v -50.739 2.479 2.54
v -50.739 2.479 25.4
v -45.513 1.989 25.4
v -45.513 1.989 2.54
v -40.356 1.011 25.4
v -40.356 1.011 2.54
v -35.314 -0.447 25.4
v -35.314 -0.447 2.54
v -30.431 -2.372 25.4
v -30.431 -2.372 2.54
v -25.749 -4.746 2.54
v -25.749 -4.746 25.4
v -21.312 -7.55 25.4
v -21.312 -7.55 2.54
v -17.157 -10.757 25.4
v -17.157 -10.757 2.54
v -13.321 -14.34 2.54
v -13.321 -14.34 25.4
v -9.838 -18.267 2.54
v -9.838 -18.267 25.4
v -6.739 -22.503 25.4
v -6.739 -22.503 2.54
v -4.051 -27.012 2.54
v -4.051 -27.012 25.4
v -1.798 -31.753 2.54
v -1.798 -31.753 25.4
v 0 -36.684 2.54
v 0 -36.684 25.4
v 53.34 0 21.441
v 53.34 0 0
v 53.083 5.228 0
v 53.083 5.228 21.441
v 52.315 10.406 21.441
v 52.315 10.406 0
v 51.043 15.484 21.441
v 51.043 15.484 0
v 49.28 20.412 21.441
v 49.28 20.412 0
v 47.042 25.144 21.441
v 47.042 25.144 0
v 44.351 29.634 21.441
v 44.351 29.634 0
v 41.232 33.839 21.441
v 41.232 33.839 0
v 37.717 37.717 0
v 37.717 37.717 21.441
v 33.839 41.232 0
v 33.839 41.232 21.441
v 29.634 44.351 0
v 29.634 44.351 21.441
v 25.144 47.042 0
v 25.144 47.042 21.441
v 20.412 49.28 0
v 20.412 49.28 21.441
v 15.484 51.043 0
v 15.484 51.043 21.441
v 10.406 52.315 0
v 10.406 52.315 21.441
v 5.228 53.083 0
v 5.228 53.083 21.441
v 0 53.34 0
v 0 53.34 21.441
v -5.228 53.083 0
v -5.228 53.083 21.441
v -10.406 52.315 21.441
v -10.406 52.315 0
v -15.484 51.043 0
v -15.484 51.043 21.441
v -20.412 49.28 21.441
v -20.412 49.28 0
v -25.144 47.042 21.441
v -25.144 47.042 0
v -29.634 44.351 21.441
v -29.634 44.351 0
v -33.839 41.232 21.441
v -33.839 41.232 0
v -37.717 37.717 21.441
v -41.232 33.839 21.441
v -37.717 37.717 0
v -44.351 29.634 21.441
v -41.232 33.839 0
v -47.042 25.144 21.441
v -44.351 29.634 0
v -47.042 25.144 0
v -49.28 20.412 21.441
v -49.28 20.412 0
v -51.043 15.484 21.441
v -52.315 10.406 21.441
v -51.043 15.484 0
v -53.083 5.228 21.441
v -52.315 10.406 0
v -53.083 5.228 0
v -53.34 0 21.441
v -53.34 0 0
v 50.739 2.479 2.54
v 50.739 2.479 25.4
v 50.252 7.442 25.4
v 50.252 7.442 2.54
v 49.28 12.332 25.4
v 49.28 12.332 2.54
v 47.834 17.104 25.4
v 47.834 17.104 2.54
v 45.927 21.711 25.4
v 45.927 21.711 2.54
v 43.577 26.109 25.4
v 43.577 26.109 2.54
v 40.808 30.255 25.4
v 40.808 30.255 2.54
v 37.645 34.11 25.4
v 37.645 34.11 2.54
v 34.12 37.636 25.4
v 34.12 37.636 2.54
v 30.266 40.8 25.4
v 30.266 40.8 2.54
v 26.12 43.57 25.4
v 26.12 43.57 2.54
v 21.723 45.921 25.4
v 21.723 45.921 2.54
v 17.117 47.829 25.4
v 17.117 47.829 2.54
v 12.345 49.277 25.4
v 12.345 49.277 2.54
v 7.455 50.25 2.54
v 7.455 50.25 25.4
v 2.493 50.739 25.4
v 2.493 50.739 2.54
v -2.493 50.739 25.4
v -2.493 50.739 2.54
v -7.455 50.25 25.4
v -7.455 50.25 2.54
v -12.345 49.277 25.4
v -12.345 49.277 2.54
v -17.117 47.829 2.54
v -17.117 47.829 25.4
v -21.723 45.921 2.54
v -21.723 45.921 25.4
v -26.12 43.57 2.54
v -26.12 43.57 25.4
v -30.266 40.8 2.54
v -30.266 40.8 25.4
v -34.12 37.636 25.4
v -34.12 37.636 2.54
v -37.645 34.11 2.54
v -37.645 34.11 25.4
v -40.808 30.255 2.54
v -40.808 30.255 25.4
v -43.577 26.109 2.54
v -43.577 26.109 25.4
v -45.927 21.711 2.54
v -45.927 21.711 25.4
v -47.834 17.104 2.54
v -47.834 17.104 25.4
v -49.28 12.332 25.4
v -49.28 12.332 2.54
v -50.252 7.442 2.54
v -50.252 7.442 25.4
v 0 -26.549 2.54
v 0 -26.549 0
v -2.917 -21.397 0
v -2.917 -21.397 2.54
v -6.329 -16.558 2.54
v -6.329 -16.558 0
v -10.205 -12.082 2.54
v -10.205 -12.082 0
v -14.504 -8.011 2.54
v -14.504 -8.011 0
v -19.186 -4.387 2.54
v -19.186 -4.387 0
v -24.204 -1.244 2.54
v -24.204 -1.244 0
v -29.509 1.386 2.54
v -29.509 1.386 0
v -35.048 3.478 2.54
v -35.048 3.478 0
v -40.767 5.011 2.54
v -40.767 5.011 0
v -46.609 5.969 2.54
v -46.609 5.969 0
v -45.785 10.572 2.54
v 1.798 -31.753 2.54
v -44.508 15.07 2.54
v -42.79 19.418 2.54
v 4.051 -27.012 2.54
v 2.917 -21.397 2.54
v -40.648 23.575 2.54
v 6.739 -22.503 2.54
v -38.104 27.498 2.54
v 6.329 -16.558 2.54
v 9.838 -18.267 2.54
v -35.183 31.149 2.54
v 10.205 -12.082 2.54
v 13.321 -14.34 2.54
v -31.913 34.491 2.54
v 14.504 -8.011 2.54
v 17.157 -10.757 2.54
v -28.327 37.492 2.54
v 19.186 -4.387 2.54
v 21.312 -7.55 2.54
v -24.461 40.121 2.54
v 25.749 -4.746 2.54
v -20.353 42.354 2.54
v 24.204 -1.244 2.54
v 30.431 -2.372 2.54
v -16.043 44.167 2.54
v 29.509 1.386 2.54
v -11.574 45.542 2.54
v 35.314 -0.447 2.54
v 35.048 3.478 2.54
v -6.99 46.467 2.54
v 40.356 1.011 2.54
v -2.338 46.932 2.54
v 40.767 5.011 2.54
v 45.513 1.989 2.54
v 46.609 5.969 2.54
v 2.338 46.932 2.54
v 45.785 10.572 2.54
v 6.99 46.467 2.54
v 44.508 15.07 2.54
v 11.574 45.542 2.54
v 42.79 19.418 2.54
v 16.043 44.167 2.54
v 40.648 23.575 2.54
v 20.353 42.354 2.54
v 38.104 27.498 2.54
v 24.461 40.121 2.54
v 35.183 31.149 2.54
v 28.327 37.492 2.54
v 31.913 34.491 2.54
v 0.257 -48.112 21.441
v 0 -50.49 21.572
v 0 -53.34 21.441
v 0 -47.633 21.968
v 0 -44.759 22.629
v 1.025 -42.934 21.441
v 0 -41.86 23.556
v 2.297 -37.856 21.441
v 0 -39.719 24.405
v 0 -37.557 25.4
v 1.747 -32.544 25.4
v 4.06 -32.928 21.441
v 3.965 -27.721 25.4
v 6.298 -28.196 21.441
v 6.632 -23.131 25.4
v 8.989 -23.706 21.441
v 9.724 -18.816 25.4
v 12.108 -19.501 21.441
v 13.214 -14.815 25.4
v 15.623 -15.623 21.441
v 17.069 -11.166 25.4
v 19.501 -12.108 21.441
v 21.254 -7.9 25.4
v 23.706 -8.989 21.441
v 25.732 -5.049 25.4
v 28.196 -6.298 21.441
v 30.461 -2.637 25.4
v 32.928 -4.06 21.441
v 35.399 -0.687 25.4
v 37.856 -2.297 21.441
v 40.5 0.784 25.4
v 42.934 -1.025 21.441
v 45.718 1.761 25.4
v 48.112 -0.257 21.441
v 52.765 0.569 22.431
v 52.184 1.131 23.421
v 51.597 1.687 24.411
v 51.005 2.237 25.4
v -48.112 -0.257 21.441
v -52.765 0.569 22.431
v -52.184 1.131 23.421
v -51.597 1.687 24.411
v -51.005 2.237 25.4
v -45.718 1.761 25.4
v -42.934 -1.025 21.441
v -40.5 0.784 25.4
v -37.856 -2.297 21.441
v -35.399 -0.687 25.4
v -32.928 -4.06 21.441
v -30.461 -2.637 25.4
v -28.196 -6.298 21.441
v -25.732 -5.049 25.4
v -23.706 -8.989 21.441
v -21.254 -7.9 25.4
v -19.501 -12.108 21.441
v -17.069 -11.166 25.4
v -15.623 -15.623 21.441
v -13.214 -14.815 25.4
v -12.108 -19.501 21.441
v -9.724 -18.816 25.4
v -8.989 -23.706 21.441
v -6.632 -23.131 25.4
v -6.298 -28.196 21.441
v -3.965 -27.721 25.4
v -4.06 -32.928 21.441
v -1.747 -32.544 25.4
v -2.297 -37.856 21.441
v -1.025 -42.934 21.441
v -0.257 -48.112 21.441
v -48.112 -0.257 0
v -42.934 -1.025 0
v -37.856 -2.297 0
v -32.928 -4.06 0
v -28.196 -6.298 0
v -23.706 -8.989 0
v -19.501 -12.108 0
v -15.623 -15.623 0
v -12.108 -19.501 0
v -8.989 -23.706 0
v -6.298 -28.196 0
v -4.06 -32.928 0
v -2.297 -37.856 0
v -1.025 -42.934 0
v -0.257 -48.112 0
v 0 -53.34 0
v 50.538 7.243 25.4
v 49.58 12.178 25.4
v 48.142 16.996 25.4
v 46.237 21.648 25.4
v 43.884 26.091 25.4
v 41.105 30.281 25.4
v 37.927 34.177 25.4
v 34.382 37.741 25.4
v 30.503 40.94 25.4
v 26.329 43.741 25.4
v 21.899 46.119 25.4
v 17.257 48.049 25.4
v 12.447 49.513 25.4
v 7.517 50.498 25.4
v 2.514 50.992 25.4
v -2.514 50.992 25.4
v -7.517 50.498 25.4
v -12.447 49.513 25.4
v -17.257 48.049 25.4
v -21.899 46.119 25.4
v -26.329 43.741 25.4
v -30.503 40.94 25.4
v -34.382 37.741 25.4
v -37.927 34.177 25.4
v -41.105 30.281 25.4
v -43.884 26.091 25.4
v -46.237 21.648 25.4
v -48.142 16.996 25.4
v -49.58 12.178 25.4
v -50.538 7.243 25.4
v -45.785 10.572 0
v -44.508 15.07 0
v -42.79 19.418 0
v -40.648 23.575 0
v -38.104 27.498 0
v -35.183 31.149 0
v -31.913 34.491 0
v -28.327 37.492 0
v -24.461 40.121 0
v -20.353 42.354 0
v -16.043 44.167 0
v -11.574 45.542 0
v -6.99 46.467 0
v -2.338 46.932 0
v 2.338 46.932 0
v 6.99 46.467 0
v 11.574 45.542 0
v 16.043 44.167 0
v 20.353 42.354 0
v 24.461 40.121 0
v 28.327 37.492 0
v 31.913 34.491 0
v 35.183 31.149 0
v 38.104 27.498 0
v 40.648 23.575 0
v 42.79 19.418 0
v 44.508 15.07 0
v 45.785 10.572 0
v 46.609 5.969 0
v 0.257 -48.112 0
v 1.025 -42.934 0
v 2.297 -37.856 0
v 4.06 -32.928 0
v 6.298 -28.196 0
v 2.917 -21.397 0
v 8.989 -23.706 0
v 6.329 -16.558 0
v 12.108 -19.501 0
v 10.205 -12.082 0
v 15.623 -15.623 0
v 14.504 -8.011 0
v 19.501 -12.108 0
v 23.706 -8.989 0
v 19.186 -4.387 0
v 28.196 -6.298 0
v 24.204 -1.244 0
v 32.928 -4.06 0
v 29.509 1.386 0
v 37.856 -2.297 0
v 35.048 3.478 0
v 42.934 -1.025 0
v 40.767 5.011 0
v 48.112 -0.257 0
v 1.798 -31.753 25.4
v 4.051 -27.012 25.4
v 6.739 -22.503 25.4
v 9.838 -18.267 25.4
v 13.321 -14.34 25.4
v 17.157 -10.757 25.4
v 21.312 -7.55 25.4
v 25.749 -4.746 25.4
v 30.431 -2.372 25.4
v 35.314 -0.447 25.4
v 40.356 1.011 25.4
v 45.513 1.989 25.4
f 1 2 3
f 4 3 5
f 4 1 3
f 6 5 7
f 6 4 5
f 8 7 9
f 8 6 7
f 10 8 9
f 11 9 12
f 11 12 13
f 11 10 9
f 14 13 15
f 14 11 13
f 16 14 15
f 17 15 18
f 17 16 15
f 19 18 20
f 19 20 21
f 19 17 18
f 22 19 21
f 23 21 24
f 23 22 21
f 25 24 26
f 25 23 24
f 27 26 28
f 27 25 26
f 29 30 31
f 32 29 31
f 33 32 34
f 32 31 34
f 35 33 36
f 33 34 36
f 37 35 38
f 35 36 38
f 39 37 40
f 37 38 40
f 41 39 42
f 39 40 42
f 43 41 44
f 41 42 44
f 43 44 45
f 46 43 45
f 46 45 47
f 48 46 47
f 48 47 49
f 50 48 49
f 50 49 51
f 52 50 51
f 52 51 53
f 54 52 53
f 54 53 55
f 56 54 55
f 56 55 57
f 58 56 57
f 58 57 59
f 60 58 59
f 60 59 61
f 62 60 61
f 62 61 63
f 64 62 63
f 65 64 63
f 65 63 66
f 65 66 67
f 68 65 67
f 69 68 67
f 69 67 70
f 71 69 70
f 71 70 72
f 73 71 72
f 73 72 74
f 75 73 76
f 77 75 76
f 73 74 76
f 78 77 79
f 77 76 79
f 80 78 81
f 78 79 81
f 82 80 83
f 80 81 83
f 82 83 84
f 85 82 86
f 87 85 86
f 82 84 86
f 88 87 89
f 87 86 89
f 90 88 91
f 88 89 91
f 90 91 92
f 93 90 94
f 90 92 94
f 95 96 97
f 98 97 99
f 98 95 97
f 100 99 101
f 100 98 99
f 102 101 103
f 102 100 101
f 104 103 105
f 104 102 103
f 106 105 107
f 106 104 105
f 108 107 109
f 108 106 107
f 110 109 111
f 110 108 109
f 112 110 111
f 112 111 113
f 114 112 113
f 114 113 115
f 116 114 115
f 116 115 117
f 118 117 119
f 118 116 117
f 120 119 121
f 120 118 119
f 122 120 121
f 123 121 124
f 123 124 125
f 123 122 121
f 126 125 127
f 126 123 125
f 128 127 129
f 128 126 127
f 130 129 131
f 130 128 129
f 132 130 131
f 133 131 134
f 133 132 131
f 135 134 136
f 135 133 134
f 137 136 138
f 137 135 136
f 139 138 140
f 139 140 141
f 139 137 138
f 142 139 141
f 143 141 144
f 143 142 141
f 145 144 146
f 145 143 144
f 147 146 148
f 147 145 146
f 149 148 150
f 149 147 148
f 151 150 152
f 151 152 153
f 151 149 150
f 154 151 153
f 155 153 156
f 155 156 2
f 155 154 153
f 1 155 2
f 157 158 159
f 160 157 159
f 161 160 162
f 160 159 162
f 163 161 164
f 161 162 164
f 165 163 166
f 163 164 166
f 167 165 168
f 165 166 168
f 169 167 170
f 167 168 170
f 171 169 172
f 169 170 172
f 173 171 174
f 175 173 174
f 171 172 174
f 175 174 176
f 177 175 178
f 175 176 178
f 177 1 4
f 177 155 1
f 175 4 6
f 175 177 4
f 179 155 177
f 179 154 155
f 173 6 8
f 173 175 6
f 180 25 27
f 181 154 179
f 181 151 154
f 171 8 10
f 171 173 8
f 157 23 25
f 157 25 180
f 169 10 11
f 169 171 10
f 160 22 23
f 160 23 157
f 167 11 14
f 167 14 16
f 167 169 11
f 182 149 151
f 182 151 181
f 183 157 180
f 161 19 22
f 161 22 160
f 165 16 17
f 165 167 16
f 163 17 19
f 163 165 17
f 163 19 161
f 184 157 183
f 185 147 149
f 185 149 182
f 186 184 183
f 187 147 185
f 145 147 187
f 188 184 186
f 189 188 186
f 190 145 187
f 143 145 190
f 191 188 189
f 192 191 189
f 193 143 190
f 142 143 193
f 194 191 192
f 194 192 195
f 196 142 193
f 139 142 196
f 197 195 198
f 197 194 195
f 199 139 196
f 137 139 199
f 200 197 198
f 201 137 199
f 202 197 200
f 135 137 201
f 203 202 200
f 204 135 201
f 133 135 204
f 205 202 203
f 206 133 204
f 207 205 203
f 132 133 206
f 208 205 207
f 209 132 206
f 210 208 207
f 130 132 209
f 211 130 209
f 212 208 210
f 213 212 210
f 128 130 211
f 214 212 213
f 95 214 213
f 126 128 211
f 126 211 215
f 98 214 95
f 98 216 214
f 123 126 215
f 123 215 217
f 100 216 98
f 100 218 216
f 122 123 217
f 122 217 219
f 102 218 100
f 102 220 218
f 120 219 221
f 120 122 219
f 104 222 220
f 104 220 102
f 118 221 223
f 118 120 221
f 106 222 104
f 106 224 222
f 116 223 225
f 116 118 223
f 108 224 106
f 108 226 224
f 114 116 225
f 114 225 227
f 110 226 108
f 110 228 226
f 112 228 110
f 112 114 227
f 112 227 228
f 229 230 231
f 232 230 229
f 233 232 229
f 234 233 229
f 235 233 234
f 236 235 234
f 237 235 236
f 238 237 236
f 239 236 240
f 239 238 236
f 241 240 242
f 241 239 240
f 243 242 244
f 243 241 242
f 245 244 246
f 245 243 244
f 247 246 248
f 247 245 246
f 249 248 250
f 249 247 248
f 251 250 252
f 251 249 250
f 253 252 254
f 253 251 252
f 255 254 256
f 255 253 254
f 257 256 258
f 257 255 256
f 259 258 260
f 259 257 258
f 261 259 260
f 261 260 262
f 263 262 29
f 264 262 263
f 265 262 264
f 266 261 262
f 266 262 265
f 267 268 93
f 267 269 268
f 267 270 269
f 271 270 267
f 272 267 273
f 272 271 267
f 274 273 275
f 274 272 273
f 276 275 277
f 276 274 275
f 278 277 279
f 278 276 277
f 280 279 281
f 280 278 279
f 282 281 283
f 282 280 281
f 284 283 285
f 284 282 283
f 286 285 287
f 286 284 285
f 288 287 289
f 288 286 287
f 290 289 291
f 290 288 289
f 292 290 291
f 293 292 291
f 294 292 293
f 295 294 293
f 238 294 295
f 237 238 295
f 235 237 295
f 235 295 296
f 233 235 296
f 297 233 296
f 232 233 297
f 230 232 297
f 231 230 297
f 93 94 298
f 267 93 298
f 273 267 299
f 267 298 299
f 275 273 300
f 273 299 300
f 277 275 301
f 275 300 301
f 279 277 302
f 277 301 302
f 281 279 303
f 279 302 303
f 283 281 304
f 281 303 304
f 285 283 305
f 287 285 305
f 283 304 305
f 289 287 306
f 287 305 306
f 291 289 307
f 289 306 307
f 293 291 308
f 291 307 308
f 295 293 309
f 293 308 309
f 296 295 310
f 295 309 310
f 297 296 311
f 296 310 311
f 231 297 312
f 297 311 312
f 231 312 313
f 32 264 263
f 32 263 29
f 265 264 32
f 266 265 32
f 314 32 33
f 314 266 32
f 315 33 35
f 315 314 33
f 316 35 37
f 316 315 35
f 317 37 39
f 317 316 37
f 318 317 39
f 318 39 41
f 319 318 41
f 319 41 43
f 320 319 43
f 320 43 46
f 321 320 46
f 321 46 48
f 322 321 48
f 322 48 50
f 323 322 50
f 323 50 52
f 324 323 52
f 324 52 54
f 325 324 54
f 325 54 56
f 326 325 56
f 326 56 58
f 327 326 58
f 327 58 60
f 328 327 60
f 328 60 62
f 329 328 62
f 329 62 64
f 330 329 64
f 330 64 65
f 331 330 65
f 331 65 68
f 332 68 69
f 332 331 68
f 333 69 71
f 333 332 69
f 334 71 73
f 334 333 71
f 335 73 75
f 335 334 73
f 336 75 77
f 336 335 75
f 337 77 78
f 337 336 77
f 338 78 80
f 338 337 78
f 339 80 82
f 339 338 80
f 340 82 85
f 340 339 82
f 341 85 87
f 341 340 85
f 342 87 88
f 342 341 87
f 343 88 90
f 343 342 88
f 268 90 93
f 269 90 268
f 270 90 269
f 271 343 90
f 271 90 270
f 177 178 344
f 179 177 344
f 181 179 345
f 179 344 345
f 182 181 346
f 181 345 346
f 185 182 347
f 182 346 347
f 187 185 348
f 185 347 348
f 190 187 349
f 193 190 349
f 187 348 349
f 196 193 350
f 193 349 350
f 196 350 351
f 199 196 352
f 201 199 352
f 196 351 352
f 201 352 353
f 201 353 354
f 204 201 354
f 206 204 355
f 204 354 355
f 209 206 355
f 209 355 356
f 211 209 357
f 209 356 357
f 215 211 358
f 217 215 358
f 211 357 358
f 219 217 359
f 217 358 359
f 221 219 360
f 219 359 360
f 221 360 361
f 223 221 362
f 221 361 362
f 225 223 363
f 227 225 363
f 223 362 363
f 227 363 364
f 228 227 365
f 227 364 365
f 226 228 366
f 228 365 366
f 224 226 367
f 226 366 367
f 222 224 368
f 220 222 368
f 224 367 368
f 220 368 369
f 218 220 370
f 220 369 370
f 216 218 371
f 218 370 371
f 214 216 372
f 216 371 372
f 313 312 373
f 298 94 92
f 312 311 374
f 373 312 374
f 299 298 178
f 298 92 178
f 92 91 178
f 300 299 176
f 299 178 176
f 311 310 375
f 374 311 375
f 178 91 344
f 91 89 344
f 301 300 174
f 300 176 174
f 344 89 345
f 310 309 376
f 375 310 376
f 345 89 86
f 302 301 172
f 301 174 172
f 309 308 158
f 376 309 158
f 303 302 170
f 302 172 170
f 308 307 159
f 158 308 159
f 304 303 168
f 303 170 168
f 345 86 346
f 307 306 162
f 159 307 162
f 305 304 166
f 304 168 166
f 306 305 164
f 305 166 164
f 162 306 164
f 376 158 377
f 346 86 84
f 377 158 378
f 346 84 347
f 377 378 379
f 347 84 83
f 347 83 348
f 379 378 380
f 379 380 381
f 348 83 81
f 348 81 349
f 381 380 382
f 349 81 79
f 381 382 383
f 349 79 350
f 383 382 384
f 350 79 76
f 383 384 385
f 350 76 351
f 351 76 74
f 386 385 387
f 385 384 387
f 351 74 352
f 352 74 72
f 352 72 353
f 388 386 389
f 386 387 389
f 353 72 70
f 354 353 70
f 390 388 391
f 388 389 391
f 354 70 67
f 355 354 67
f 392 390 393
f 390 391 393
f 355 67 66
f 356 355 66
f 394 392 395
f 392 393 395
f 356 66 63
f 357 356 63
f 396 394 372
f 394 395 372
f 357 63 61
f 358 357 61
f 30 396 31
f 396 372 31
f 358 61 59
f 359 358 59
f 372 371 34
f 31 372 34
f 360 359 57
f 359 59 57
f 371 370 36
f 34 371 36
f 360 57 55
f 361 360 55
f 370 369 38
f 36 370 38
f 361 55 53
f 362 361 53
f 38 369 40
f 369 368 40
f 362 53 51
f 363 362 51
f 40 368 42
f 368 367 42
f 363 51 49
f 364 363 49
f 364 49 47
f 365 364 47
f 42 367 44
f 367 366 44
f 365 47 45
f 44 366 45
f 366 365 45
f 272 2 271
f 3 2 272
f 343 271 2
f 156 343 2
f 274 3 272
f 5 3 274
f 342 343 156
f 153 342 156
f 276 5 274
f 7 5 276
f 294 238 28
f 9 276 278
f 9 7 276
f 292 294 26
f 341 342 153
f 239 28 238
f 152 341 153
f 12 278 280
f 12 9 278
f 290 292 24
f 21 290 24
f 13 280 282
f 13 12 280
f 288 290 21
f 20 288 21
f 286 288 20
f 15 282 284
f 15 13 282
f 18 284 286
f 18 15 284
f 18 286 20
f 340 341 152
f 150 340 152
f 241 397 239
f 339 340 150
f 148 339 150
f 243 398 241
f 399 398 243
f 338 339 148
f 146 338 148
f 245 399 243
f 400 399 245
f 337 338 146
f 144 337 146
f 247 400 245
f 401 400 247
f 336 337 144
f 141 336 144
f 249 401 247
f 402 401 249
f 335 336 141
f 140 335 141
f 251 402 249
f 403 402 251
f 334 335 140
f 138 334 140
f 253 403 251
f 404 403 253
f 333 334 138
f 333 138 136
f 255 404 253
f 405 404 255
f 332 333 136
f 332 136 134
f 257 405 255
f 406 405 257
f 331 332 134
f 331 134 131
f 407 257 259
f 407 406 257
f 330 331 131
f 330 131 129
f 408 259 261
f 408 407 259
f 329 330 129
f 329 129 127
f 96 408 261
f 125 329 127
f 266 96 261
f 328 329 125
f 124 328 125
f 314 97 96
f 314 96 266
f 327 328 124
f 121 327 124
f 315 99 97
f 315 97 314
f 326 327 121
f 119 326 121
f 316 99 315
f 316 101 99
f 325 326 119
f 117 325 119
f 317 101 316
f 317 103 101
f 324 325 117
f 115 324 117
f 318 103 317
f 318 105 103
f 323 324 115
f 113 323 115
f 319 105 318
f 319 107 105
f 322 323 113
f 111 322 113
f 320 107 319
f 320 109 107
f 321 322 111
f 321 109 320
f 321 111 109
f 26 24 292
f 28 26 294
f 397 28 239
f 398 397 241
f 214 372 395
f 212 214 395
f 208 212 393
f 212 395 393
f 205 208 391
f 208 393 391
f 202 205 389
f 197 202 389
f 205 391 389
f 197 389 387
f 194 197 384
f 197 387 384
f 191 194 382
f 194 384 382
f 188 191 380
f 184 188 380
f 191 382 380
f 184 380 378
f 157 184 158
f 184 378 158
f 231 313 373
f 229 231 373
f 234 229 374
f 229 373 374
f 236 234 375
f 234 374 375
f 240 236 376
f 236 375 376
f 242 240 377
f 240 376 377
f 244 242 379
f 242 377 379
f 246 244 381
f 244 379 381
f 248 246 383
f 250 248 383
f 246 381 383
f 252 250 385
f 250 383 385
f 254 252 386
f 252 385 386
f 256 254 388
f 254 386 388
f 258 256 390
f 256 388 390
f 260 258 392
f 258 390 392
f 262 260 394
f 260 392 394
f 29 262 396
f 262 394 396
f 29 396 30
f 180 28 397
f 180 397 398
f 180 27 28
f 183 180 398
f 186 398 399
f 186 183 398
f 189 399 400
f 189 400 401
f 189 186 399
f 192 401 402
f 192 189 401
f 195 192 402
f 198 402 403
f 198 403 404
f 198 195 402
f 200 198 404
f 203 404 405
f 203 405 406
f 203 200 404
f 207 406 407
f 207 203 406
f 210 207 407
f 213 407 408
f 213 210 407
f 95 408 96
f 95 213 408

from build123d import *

# Parameters (mm, degrees)
F1_DEPTH    = 25.4
F2_T        = -2.54
F3_T2_ANGLE = 202.0417037701
F3_T4_ANGLE = 119.7204573229
F3_T6_ANGLE = 119.7204573229
F5_DEPTH    = 2.54


# Not quite as in the source:
# - a fillet or chamfer that OpenCascade refuses, or shapes differently, is made with other operations: its cross-section is extruded or revolved along the edge and cut away or added


with BuildPart() as f1:
    # F0 (on Top) → F1 (new body)
    with BuildSketch(Plane.XY):
        with BuildLine():
            ThreePointArc((-53.34, 0), (-15.6229242915, -15.6229242915), (0, -53.34))
            ThreePointArc((0, -53.34), (15.6229242915, -15.6229242915), (53.34, 0))
            ThreePointArc((53.34, 0), (0, 53.34), (-53.34, 0))
        make_face()
    extrude(amount=F1_DEPTH)

    # F2
    f2_openings = [f1.faces().sort_by_distance(p)[0] for p in [
        (0, 15.223138, 25.4),
    ]]
    offset(amount=F2_T, openings=f2_openings)

    # F3: chamfer of 2.286 x 3.9594681461 on 3 edges, made by hand

    # F3_s1 → F3_t2 (revolve, cut)
    with BuildSketch(Plane(origin=(0, 0, 0), x_dir=(0, 0, 1), z_dir=(-0.1911662303, -0.9815576766, 0))):
        Polygon((21.4405318539, -53.34), (25.4, -51.054), (25.4, -53.34), align=None)
    revolve(axis=Axis((0, 0, 25.4), (0, 0, 1)), revolution_arc=F3_T2_ANGLE, mode=Mode.SUBTRACT)

    # F3_s3 → F3_t4 (revolve, cut)
    with BuildSketch(Plane(origin=(-61.3926477335, -11.9419473665, 0), x_dir=(0, 0, 1), z_dir=(-0.9816019423, -0.190938804, 0))):
        Polygon((21.4405318539, 11.1660282003), (25.4, 13.4520282003), (25.4, 11.1660282003), align=None)
    revolve(axis=Axis((-53.34, -53.34, 25.4), (0, 0, -1)), revolution_arc=F3_T4_ANGLE, mode=Mode.SUBTRACT)

    # F3_s5 → F3_t6 (revolve, cut)
    with BuildSketch(Plane(origin=(21.6984854346, -64.0579906243, 0), x_dir=(0, 0, 1), z_dir=(0.3208259227, -0.9471381775, 0))):
        Polygon((21.4405318539, 19.9325043289), (25.4, 22.2185043289), (25.4, 19.9325043289), align=None)
    revolve(axis=Axis((53.34, -53.34, 25.4), (0, 0, -1)), revolution_arc=F3_T6_ANGLE, mode=Mode.SUBTRACT)

    # F4 (on face) → F5 (cut, through all)
    with BuildSketch(Plane(origin=(0, 0, 0), x_dir=(1, 0, 0), z_dir=(0, 0, -1))):
        with BuildLine():
            ThreePointArc((-46.6093067615, -5.9693067615), (0, -46.99), (46.6093067615, -5.9693067615))
            ThreePointArc((46.6093067615, -5.9693067615), (19.1861227863, 4.3868716907), (0, 26.5493206506))
            ThreePointArc((0, 26.5493206506), (-19.1861227863, 4.3868716907), (-46.6093067615, -5.9693067615))
        make_face()
    extrude(amount=-F5_DEPTH, mode=Mode.SUBTRACT)


solid = f1.part
